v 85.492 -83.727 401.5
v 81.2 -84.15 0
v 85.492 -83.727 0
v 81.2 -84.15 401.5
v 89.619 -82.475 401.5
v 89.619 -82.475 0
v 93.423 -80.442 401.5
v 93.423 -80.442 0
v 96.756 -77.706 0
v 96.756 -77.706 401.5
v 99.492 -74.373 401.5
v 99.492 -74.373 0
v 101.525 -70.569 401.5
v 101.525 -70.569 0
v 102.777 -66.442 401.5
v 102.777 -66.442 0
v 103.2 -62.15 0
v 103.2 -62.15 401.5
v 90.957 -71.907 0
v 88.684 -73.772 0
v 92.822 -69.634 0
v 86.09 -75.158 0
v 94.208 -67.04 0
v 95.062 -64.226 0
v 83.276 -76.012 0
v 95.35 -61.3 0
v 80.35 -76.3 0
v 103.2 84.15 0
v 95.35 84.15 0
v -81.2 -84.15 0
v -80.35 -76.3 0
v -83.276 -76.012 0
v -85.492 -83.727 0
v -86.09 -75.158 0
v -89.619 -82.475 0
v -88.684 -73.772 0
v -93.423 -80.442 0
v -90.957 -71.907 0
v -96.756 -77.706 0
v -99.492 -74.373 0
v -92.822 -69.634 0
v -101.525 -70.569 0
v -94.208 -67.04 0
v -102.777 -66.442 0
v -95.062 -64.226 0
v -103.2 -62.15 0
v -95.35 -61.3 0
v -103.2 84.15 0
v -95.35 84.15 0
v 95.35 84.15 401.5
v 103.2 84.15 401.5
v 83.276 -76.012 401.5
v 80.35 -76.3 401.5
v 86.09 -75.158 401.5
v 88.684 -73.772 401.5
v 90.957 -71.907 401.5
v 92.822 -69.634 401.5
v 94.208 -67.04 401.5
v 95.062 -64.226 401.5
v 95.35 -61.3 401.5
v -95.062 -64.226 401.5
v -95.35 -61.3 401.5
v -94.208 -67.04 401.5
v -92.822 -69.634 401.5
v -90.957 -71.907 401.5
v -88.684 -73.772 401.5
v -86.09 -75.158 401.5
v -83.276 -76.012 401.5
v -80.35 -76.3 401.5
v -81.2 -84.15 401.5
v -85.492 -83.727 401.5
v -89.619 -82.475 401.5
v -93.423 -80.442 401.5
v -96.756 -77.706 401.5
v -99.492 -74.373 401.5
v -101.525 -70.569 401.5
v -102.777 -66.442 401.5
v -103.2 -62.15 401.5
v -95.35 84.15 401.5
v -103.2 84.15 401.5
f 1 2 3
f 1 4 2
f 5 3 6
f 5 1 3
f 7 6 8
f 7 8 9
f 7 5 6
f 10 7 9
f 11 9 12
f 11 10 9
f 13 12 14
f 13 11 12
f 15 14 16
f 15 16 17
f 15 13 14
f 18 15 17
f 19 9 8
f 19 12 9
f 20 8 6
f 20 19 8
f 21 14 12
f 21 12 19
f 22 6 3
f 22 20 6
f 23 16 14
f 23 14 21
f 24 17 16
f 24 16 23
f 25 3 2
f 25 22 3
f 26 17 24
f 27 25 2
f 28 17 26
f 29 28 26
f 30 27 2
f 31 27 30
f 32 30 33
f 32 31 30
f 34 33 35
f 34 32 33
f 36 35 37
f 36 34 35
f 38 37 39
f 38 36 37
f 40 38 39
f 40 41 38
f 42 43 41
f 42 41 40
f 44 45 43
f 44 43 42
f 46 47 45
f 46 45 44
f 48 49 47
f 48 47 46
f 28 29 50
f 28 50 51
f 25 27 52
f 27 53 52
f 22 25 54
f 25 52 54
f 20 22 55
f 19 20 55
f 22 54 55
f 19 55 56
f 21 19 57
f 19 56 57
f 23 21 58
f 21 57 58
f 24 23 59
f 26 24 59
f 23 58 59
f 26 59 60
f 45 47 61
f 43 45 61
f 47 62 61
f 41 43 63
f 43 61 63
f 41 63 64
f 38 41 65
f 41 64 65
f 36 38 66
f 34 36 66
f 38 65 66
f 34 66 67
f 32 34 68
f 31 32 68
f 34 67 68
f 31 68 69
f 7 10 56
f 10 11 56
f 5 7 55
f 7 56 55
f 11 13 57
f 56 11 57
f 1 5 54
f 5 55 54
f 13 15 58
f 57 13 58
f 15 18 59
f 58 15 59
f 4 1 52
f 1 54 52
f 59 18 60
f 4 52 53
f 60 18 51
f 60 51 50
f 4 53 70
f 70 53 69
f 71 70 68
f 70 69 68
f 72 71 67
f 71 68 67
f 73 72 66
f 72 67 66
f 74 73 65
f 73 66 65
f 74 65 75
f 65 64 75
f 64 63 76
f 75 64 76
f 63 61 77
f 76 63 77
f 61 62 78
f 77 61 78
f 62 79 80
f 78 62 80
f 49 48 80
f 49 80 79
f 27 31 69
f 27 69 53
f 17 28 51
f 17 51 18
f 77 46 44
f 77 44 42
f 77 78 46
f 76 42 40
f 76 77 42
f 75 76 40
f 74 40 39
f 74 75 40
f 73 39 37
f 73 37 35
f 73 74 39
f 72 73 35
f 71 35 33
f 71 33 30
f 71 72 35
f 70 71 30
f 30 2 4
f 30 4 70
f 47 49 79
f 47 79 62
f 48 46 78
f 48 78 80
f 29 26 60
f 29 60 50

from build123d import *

# Parameters (mm, degrees)
BOSS_EXTRUDE1_DEPTH = 401.5
FILLET2_R           = 15
FILLET4_R           = 22


with BuildPart() as part:
    # Sketch1 → Boss-Extrude1 (new body)
    with BuildSketch(Plane.XY):
        Polygon((-95.35, 84.15), (-95.35, -76.3), (95.35, -76.3), (95.35, 84.15), (103.2, 84.15), (103.2, -84.15), (-103.2, -84.15), (-103.2, 84.15), align=None)
    extrude(amount=BOSS_EXTRUDE1_DEPTH)

    # Fillet2
    fillet2_edges = [part.edges().sort_by_distance(p)[0] for p in [
        (-95.35, -76.3, 200.75),
        (95.35, -76.3, 200.75),
    ]]
    fillet(fillet2_edges, radius=FILLET2_R)

    # Fillet4
    fillet4_edges = [part.edges().sort_by_distance(p)[0] for p in [
        (103.2, -84.15, 200.75),
        (-103.2, -84.15, 200.75),
    ]]
    fillet(fillet4_edges, radius=FILLET4_R)


solid = part.part
